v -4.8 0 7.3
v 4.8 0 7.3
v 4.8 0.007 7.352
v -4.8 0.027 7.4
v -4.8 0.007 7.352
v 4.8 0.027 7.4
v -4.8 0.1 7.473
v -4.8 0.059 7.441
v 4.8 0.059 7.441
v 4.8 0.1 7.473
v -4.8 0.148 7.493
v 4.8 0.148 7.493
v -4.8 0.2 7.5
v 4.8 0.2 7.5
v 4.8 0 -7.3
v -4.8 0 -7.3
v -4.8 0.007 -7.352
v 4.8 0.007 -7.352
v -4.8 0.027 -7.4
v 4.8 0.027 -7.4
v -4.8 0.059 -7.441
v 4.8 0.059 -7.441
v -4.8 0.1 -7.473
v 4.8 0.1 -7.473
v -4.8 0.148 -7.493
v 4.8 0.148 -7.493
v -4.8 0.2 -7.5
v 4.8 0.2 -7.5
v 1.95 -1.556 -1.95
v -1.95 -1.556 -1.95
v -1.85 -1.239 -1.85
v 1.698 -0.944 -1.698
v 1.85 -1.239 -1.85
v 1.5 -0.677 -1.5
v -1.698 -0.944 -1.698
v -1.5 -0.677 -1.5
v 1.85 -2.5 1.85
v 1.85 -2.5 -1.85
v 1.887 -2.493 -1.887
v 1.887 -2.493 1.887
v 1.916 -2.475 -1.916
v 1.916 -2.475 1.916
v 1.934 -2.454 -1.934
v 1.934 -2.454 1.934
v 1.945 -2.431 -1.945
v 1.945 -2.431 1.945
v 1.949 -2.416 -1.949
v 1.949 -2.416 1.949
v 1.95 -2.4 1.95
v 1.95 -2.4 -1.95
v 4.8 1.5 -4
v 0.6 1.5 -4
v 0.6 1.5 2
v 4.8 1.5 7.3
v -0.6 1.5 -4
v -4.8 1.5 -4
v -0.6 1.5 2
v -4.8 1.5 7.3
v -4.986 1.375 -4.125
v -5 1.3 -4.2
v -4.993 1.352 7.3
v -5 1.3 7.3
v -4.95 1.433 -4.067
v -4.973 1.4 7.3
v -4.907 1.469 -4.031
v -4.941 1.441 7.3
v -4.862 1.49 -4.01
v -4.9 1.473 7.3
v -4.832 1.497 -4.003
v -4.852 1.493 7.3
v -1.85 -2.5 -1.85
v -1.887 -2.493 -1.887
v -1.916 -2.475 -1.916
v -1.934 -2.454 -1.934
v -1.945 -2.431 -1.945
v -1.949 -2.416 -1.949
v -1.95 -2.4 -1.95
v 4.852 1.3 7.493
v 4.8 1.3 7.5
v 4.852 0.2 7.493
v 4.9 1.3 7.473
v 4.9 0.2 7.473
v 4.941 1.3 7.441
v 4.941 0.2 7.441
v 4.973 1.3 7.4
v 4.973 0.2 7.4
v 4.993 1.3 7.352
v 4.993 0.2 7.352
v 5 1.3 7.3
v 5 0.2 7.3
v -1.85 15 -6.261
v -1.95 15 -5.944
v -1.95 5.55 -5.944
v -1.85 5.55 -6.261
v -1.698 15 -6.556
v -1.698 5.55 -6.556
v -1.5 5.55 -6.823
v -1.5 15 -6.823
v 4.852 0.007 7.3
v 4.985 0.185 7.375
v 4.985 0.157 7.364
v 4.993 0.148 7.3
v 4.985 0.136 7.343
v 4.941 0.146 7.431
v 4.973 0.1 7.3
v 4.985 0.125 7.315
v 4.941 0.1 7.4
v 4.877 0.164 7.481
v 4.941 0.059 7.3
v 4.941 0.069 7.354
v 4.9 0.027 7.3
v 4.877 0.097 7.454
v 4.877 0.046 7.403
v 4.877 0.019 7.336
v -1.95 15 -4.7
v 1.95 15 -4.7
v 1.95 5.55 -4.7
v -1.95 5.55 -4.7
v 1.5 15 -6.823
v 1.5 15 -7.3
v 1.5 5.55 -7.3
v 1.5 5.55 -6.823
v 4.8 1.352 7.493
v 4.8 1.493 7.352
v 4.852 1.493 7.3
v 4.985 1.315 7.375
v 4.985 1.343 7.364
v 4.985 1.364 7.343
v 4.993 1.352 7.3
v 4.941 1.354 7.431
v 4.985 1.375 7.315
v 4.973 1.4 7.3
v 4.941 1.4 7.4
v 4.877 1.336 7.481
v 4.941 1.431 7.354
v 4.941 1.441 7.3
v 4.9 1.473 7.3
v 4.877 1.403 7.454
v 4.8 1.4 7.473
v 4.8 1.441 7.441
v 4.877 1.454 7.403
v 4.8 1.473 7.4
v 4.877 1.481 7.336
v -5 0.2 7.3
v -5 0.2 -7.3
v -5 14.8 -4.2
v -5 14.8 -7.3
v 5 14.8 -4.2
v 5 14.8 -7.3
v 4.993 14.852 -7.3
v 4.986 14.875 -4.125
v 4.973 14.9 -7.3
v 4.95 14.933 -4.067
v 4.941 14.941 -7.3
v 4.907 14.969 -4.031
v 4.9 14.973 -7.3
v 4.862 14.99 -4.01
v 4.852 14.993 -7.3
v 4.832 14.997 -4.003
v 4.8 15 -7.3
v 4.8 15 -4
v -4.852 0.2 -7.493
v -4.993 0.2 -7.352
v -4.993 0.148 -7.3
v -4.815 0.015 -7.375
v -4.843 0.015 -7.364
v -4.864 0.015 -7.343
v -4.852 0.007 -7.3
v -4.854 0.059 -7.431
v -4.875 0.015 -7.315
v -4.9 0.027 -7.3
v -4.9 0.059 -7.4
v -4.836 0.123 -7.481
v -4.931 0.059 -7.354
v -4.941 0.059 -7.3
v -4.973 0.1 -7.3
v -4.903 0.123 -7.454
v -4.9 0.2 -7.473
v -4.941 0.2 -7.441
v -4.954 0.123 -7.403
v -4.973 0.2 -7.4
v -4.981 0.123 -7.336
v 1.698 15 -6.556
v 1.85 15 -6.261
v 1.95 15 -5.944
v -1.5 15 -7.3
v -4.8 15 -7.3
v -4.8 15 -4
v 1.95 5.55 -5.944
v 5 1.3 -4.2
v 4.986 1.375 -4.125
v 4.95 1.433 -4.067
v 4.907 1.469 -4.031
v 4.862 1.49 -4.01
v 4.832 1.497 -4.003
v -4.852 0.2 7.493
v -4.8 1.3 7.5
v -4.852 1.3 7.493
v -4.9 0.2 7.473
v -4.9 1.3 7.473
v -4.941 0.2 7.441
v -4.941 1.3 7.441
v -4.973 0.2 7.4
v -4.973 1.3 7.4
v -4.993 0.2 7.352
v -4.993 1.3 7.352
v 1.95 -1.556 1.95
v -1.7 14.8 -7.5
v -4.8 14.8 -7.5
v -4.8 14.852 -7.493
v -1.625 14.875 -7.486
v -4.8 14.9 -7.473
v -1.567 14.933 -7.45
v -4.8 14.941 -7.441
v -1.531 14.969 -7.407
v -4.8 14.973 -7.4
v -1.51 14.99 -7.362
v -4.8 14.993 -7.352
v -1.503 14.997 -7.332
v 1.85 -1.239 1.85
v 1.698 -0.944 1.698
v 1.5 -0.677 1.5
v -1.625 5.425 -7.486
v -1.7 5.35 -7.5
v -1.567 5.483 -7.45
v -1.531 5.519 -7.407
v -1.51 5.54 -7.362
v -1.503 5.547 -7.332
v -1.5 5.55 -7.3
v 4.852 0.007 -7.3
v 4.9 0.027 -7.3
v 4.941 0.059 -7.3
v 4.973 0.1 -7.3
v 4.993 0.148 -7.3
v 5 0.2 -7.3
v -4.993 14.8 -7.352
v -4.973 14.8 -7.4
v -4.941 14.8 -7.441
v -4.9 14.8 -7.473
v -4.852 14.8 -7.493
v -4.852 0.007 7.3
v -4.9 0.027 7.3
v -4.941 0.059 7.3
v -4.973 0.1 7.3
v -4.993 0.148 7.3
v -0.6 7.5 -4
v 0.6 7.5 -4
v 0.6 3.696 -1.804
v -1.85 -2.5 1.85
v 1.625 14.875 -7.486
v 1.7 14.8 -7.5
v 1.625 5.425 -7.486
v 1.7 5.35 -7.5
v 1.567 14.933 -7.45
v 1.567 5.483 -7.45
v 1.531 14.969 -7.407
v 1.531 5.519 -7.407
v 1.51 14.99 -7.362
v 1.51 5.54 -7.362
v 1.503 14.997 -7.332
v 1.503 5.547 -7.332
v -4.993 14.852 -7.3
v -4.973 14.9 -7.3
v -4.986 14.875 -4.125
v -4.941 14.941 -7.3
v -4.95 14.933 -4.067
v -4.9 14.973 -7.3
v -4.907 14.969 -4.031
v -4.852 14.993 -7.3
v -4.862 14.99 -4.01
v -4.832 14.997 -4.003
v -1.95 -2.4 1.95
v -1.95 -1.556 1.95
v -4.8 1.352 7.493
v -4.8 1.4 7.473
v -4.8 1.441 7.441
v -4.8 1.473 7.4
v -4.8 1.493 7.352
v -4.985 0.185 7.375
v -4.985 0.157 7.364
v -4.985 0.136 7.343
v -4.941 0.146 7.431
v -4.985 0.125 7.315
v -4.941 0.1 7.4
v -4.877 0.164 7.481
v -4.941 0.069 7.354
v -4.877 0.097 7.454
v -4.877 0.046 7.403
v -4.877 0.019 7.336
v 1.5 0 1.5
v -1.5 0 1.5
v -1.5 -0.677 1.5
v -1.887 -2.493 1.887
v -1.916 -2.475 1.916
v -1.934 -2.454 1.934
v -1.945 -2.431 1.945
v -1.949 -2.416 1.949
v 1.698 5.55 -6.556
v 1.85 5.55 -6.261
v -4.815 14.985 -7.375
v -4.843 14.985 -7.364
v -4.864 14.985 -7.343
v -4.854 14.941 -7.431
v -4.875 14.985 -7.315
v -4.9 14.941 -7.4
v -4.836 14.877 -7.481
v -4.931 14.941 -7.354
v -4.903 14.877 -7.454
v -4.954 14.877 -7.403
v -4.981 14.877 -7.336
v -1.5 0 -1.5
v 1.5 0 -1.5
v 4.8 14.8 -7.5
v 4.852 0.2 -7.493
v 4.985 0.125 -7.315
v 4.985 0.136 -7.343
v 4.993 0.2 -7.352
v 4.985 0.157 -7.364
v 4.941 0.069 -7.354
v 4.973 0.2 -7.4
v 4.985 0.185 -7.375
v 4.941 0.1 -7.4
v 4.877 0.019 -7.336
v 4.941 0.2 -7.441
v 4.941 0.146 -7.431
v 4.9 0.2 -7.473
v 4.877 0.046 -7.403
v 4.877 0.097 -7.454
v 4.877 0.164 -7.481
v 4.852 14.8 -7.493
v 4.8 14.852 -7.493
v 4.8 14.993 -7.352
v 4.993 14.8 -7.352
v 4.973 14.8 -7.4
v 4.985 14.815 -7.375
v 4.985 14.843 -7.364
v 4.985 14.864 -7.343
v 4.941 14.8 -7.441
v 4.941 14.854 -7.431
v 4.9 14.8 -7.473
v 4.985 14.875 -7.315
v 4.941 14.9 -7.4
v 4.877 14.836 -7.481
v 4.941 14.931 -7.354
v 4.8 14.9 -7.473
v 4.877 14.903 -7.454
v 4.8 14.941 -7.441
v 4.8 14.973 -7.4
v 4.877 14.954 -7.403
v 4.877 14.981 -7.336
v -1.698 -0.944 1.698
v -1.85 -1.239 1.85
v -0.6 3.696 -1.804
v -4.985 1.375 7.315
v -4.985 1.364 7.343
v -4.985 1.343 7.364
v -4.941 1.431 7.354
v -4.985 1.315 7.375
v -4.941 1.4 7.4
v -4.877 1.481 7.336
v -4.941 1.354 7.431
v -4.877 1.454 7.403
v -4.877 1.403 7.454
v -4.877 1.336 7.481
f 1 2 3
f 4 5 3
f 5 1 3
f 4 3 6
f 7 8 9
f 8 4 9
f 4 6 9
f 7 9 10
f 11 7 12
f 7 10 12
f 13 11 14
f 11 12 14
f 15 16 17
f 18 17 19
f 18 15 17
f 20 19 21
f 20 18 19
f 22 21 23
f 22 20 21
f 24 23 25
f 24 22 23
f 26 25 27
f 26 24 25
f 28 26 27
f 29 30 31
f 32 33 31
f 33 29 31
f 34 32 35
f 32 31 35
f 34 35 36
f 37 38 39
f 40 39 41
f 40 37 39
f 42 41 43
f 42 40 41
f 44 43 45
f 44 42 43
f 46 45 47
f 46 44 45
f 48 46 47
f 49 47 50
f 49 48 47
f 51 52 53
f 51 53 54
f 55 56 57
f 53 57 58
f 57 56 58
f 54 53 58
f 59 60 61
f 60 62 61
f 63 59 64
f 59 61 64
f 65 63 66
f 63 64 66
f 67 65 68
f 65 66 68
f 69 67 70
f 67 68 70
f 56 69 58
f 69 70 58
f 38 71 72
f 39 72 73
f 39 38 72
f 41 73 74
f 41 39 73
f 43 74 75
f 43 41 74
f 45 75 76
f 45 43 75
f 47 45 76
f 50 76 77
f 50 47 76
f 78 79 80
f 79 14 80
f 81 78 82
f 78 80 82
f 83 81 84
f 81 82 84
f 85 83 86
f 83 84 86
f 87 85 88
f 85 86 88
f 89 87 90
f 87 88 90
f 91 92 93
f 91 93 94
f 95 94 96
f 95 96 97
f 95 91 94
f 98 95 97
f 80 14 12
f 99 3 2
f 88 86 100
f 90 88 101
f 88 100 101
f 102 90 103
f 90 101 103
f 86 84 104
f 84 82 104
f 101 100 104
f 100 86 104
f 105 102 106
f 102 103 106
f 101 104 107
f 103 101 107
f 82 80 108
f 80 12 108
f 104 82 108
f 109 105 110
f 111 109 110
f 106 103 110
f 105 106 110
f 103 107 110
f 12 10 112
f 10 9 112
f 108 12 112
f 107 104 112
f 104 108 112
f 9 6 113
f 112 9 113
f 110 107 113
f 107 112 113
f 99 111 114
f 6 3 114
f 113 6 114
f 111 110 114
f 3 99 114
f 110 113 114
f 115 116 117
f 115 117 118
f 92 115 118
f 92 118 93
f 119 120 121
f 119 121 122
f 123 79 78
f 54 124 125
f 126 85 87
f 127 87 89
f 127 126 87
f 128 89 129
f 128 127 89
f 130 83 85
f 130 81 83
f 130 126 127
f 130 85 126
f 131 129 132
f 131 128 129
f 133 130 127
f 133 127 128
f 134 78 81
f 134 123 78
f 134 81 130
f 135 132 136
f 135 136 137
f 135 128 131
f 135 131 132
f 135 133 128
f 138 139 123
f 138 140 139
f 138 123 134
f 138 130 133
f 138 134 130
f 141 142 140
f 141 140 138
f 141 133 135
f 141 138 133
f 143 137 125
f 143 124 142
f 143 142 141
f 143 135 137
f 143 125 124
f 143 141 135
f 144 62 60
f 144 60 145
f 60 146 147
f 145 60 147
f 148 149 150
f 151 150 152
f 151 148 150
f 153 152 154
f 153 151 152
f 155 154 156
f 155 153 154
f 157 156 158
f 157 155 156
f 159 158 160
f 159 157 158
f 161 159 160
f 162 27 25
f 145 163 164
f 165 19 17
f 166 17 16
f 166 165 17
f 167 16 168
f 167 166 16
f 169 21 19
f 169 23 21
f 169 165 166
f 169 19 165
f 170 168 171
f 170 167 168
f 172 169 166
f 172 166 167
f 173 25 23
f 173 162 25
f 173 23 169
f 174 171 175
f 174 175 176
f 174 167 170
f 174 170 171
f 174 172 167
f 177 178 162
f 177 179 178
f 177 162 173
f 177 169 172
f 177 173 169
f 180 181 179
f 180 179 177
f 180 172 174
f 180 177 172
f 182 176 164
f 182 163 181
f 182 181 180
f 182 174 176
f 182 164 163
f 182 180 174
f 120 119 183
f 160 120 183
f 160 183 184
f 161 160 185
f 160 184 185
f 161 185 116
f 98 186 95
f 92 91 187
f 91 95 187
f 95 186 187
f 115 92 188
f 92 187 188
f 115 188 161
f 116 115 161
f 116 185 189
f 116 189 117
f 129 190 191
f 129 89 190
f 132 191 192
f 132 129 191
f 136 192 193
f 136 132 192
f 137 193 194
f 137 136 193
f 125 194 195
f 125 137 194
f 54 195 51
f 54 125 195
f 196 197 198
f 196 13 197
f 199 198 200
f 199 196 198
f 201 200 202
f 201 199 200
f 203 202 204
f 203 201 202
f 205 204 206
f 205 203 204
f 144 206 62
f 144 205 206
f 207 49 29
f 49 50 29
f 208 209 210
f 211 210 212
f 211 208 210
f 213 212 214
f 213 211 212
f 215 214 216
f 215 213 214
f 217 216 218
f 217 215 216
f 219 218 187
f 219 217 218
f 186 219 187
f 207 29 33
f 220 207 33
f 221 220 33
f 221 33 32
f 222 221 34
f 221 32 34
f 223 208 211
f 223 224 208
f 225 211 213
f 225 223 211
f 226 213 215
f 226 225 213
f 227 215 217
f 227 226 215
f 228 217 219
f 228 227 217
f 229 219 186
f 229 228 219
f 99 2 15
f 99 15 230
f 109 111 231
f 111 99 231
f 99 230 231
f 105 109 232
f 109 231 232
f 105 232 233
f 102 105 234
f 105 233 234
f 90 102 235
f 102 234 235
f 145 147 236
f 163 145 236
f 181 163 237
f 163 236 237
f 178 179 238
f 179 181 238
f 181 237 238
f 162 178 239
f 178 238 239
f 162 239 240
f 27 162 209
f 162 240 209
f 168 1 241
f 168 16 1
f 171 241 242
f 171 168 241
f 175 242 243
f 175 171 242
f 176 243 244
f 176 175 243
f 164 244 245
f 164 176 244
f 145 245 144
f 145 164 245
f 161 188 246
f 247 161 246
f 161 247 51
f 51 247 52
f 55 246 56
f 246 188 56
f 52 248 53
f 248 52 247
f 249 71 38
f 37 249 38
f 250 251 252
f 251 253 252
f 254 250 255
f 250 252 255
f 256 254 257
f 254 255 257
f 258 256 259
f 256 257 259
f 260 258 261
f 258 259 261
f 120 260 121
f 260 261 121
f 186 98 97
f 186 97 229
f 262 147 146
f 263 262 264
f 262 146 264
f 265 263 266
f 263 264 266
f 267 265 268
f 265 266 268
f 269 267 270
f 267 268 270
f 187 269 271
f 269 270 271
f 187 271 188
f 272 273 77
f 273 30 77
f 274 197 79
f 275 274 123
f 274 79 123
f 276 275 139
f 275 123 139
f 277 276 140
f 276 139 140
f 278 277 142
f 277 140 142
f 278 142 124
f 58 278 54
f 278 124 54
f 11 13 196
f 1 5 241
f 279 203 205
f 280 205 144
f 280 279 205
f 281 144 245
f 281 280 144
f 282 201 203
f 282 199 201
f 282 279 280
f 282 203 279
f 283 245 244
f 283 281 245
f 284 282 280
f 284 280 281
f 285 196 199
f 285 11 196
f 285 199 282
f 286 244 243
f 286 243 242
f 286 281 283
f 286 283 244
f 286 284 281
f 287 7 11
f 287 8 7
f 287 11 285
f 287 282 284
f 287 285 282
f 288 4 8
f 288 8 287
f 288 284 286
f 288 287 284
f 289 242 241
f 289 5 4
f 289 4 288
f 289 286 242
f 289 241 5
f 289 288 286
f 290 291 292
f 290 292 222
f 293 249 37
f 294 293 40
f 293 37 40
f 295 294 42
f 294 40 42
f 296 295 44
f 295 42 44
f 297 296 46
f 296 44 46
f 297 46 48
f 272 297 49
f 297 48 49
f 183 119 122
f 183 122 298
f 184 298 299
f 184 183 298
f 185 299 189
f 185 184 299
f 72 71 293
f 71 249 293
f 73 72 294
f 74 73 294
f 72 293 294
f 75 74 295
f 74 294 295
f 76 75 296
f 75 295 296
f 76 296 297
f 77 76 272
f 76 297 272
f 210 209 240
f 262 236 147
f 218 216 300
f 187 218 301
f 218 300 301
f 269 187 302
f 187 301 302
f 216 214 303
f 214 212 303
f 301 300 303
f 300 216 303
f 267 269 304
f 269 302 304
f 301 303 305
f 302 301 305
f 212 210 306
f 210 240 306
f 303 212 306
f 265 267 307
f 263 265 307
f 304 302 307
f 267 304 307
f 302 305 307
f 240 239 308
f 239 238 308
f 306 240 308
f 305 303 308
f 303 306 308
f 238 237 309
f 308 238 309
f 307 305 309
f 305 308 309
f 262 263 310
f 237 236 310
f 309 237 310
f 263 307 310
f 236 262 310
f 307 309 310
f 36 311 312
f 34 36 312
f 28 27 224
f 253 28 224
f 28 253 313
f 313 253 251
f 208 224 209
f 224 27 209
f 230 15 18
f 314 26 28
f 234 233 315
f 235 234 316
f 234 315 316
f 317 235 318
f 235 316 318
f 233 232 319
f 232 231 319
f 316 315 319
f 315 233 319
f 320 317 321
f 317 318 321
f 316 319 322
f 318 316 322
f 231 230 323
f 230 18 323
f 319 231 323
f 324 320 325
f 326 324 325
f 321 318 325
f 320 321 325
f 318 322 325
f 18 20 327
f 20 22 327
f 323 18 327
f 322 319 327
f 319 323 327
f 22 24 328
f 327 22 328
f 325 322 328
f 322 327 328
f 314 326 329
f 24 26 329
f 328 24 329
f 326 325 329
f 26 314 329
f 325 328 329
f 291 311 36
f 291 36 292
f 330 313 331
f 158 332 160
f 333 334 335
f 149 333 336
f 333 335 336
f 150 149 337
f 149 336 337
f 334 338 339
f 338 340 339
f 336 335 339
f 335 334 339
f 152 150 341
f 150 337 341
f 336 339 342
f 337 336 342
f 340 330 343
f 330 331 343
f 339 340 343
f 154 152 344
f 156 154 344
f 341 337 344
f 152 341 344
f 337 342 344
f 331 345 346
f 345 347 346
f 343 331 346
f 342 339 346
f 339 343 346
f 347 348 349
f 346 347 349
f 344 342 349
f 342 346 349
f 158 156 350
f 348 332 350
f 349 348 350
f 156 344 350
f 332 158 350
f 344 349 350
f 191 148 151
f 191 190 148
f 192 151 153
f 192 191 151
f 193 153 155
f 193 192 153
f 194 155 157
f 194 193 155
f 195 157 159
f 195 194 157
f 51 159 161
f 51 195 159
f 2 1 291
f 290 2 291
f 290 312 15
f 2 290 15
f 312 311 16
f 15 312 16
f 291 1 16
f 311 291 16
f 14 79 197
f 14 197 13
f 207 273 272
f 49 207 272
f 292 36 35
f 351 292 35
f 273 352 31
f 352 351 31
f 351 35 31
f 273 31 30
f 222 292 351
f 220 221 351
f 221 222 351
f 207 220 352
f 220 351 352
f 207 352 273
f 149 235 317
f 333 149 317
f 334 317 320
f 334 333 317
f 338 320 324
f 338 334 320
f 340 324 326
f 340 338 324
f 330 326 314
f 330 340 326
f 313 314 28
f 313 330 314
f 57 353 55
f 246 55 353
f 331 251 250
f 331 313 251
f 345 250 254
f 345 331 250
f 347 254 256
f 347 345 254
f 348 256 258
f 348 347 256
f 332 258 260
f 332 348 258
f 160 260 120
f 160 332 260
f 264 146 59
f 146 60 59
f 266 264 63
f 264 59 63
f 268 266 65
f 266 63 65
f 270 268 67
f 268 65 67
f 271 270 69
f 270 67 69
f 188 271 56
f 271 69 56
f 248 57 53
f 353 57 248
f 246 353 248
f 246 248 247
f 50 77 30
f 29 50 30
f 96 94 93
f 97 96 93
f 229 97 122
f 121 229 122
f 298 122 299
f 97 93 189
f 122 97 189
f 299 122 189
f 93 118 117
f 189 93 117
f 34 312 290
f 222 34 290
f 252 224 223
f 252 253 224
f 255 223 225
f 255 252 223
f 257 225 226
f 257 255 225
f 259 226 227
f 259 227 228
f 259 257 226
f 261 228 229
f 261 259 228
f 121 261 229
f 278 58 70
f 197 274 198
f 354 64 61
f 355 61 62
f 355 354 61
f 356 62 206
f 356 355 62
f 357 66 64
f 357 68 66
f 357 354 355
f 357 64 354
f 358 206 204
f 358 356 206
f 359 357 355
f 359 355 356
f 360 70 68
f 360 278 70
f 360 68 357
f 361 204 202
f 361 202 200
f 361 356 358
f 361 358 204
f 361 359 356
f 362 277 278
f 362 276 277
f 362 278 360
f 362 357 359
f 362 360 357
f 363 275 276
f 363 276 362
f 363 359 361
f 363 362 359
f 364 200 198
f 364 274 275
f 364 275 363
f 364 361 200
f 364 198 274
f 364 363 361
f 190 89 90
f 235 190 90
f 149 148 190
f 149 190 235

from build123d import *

# Parameters (mm, degrees)
EXTRUDE_1_DEPTH      = 5
EXTRUDE_1_DEPTH_BACK = 5
EXTRUDE_2_DEPTH      = 0.6
EXTRUDE_2_DEPTH_BACK = 0.6
SKETCH_3_W           = 3
SKETCH_3_H           = 3
EXTRUDE_3_DEPTH      = 1
EXTRUDE_4_DEPTH      = 1
EXTRUDE_4_DEPTH_BACK = 4
CUT_EXTRUDE_1_REACH  = 20.154
CUT_EXTRUDE_2_DEPTH  = 9.45
FILLET_1_R           = 0.1
FILLET_2_R           = 0.2


with BuildPart() as part:
    # 草图1 → 凸台-拉伸1 (new, two sides: drawn at the far end of the back side and taken through both)
    with BuildSketch(Plane(origin=(0, 0, 0), x_dir=(0, 0, -1), z_dir=(1, 0, 0)).offset(-EXTRUDE_1_DEPTH_BACK)):
        Polygon((-7.5, 0), (7.5, 0), (7.5, 15), (4, 15), (4, 1.5), (-7.5, 1.5), align=None)
    extrude(amount=EXTRUDE_1_DEPTH + EXTRUDE_1_DEPTH_BACK)

    # 草图2 → 凸台-拉伸2 (add, two sides: drawn at the far end of the back side and taken through both)
    with BuildSketch(Plane(origin=(0, 0, 0), x_dir=(0, 0, -1), z_dir=(1, 0, 0)).offset(-EXTRUDE_2_DEPTH_BACK)):
        Polygon((-2, 1.5), (1.803847577, 3.696152423), (4, 7.5), (4, 1.5), align=None)
    extrude(amount=EXTRUDE_2_DEPTH + EXTRUDE_2_DEPTH_BACK)

    # 草图3 → 凸台-拉伸3 (add)
    with BuildSketch(Plane.XZ):
        Rectangle(SKETCH_3_W, SKETCH_3_H)
    extrude(amount=EXTRUDE_3_DEPTH)

    # 草图4 → 凸台-拉伸4 (add, two sides: drawn at the far end of the back side and taken through both)
    with BuildSketch(Plane.XY.offset(1.5).offset(-EXTRUDE_4_DEPTH_BACK)):
        with BuildLine():
            Line((-1.95, -2.5), (1.95, -2.5))
            Line((1.95, -2.5), (1.95, -1.555590279))
            ThreePointArc((1.95, -1.555590279), (1.780042303, -1.088161527), (1.5, -0.677124344))
            Line((1.5, -0.677124344), (-1.5, -0.677124344))
            ThreePointArc((-1.5, -0.677124344), (-1.780042303, -1.088161527), (-1.95, -1.555590279))
            Line((-1.95, -1.555590279), (-1.95, -2.5))
        make_face()
    extrude(amount=EXTRUDE_4_DEPTH + EXTRUDE_4_DEPTH_BACK)

    # 草图5 → 切除-拉伸1 (cut, up to next)
    with BuildSketch(Plane.ZY.offset(1.95), mode=Mode.PRIVATE) as cut_extrude_1_sk1:
        with BuildLine():
            Line((-1.95, -2.5), (-1.95, -1.555590279))
            ThreePointArc((-1.95, -1.555590279), (-1.780042303, -1.088161527), (-1.5, -0.677124344))
            Line((-1.5, -0.677124344), (-2.5, -0.677124344))
            Line((-2.5, -0.677124344), (-2.5, -2.5))
            Line((-2.5, -2.5), (-1.95, -2.5))
        make_face()
    cut_extrude_1_tool1 = extrude(cut_extrude_1_sk1.sketch, amount=-CUT_EXTRUDE_1_REACH, mode=Mode.PRIVATE) & part.part
    # 草图5 → 切除-拉伸1 (cut, up to next)
    with BuildSketch(Plane.ZY.offset(1.95), mode=Mode.PRIVATE) as cut_extrude_1_sk2:
        with BuildLine():
            Line((2.5, -2.5), (2.5, -0.677124344))
            Line((2.5, -0.677124344), (1.5, -0.677124344))
            ThreePointArc((1.5, -0.677124344), (1.780042303, -1.088161527), (1.95, -1.555590279))
            Line((1.95, -1.555590279), (1.95, -2.5))
            Line((1.95, -2.5), (2.5, -2.5))
        make_face()
    cut_extrude_1_tool2 = extrude(cut_extrude_1_sk2.sketch, amount=-CUT_EXTRUDE_1_REACH, mode=Mode.PRIVATE) & part.part
    add(cut_extrude_1_tool1.solids().sort_by_distance((-1.95, -1.500125, -2.169375))[0], mode=Mode.SUBTRACT)
    add(cut_extrude_1_tool2.solids().sort_by_distance((-1.95, -1.500125, 2.169375))[0], mode=Mode.SUBTRACT)

    # 草图6 → 切除-拉伸2 (cut)
    with BuildSketch(Plane(origin=(0, 15, 0), x_dir=(-1, 0, 0), z_dir=(0, 1, 0))):
        with BuildLine():
            Line((1.5, -7.5), (-1.5, -7.5))
            Line((-1.5, -7.5), (-1.5, -6.822875656))
            ThreePointArc((-1.5, -6.822875656), (-1.780042303, -6.411838473), (-1.95, -5.944409721))
            Line((-1.95, -5.944409721), (-1.95, -4.7))
            Line((-1.95, -4.7), (1.95, -4.7))
            Line((1.95, -4.7), (1.95, -5.944409721))
            ThreePointArc((1.95, -5.944409721), (1.780042303, -6.411838473), (1.5, -6.822875656))
            Line((1.5, -6.822875656), (1.5, -7.5))
        make_face()
    extrude(amount=-CUT_EXTRUDE_2_DEPTH, mode=Mode.SUBTRACT)

    # 圆角1
    fillet_1_edges = [part.edges().sort_by_distance(p)[0] for p in [
        (-1.95, -2.5, 0),
        (1.95, -2.5, 0),
        (0, -2.5, -1.95),
        (0, -2.5, 1.95),
    ]]
    fillet(fillet_1_edges, radius=FILLET_1_R)

    # 圆角2
    fillet_2_edges = [part.edges().sort_by_distance(p)[0] for p in [
        (-5, 7.5, -7.5),
        (0, 1.5, 7.5),
        (-3.25, 15, -7.5),
        (0, 0, -7.5),
        (0, 0, 7.5),
        (3.25, 15, -7.5),
        (0, 5.55, -7.5),
        (-1.5, 10.275, -7.5),
        (1.5, 10.275, -7.5),
        (-5, 15, -5.75),
        (-5, 8.25, -4),
        (5, 0.75, 7.5),
        (5, 0, 0),
        (5, 7.5, -7.5),
        (5, 15, -5.75),
        (5, 8.25, -4),
        (-5, 1.5, 1.75),
        (5, 1.5, 1.75),
        (-5, 0.75, 7.5),
        (-5, 0, 0),
    ]]
    fillet(fillet_2_edges, radius=FILLET_2_R)


solid = part.part
